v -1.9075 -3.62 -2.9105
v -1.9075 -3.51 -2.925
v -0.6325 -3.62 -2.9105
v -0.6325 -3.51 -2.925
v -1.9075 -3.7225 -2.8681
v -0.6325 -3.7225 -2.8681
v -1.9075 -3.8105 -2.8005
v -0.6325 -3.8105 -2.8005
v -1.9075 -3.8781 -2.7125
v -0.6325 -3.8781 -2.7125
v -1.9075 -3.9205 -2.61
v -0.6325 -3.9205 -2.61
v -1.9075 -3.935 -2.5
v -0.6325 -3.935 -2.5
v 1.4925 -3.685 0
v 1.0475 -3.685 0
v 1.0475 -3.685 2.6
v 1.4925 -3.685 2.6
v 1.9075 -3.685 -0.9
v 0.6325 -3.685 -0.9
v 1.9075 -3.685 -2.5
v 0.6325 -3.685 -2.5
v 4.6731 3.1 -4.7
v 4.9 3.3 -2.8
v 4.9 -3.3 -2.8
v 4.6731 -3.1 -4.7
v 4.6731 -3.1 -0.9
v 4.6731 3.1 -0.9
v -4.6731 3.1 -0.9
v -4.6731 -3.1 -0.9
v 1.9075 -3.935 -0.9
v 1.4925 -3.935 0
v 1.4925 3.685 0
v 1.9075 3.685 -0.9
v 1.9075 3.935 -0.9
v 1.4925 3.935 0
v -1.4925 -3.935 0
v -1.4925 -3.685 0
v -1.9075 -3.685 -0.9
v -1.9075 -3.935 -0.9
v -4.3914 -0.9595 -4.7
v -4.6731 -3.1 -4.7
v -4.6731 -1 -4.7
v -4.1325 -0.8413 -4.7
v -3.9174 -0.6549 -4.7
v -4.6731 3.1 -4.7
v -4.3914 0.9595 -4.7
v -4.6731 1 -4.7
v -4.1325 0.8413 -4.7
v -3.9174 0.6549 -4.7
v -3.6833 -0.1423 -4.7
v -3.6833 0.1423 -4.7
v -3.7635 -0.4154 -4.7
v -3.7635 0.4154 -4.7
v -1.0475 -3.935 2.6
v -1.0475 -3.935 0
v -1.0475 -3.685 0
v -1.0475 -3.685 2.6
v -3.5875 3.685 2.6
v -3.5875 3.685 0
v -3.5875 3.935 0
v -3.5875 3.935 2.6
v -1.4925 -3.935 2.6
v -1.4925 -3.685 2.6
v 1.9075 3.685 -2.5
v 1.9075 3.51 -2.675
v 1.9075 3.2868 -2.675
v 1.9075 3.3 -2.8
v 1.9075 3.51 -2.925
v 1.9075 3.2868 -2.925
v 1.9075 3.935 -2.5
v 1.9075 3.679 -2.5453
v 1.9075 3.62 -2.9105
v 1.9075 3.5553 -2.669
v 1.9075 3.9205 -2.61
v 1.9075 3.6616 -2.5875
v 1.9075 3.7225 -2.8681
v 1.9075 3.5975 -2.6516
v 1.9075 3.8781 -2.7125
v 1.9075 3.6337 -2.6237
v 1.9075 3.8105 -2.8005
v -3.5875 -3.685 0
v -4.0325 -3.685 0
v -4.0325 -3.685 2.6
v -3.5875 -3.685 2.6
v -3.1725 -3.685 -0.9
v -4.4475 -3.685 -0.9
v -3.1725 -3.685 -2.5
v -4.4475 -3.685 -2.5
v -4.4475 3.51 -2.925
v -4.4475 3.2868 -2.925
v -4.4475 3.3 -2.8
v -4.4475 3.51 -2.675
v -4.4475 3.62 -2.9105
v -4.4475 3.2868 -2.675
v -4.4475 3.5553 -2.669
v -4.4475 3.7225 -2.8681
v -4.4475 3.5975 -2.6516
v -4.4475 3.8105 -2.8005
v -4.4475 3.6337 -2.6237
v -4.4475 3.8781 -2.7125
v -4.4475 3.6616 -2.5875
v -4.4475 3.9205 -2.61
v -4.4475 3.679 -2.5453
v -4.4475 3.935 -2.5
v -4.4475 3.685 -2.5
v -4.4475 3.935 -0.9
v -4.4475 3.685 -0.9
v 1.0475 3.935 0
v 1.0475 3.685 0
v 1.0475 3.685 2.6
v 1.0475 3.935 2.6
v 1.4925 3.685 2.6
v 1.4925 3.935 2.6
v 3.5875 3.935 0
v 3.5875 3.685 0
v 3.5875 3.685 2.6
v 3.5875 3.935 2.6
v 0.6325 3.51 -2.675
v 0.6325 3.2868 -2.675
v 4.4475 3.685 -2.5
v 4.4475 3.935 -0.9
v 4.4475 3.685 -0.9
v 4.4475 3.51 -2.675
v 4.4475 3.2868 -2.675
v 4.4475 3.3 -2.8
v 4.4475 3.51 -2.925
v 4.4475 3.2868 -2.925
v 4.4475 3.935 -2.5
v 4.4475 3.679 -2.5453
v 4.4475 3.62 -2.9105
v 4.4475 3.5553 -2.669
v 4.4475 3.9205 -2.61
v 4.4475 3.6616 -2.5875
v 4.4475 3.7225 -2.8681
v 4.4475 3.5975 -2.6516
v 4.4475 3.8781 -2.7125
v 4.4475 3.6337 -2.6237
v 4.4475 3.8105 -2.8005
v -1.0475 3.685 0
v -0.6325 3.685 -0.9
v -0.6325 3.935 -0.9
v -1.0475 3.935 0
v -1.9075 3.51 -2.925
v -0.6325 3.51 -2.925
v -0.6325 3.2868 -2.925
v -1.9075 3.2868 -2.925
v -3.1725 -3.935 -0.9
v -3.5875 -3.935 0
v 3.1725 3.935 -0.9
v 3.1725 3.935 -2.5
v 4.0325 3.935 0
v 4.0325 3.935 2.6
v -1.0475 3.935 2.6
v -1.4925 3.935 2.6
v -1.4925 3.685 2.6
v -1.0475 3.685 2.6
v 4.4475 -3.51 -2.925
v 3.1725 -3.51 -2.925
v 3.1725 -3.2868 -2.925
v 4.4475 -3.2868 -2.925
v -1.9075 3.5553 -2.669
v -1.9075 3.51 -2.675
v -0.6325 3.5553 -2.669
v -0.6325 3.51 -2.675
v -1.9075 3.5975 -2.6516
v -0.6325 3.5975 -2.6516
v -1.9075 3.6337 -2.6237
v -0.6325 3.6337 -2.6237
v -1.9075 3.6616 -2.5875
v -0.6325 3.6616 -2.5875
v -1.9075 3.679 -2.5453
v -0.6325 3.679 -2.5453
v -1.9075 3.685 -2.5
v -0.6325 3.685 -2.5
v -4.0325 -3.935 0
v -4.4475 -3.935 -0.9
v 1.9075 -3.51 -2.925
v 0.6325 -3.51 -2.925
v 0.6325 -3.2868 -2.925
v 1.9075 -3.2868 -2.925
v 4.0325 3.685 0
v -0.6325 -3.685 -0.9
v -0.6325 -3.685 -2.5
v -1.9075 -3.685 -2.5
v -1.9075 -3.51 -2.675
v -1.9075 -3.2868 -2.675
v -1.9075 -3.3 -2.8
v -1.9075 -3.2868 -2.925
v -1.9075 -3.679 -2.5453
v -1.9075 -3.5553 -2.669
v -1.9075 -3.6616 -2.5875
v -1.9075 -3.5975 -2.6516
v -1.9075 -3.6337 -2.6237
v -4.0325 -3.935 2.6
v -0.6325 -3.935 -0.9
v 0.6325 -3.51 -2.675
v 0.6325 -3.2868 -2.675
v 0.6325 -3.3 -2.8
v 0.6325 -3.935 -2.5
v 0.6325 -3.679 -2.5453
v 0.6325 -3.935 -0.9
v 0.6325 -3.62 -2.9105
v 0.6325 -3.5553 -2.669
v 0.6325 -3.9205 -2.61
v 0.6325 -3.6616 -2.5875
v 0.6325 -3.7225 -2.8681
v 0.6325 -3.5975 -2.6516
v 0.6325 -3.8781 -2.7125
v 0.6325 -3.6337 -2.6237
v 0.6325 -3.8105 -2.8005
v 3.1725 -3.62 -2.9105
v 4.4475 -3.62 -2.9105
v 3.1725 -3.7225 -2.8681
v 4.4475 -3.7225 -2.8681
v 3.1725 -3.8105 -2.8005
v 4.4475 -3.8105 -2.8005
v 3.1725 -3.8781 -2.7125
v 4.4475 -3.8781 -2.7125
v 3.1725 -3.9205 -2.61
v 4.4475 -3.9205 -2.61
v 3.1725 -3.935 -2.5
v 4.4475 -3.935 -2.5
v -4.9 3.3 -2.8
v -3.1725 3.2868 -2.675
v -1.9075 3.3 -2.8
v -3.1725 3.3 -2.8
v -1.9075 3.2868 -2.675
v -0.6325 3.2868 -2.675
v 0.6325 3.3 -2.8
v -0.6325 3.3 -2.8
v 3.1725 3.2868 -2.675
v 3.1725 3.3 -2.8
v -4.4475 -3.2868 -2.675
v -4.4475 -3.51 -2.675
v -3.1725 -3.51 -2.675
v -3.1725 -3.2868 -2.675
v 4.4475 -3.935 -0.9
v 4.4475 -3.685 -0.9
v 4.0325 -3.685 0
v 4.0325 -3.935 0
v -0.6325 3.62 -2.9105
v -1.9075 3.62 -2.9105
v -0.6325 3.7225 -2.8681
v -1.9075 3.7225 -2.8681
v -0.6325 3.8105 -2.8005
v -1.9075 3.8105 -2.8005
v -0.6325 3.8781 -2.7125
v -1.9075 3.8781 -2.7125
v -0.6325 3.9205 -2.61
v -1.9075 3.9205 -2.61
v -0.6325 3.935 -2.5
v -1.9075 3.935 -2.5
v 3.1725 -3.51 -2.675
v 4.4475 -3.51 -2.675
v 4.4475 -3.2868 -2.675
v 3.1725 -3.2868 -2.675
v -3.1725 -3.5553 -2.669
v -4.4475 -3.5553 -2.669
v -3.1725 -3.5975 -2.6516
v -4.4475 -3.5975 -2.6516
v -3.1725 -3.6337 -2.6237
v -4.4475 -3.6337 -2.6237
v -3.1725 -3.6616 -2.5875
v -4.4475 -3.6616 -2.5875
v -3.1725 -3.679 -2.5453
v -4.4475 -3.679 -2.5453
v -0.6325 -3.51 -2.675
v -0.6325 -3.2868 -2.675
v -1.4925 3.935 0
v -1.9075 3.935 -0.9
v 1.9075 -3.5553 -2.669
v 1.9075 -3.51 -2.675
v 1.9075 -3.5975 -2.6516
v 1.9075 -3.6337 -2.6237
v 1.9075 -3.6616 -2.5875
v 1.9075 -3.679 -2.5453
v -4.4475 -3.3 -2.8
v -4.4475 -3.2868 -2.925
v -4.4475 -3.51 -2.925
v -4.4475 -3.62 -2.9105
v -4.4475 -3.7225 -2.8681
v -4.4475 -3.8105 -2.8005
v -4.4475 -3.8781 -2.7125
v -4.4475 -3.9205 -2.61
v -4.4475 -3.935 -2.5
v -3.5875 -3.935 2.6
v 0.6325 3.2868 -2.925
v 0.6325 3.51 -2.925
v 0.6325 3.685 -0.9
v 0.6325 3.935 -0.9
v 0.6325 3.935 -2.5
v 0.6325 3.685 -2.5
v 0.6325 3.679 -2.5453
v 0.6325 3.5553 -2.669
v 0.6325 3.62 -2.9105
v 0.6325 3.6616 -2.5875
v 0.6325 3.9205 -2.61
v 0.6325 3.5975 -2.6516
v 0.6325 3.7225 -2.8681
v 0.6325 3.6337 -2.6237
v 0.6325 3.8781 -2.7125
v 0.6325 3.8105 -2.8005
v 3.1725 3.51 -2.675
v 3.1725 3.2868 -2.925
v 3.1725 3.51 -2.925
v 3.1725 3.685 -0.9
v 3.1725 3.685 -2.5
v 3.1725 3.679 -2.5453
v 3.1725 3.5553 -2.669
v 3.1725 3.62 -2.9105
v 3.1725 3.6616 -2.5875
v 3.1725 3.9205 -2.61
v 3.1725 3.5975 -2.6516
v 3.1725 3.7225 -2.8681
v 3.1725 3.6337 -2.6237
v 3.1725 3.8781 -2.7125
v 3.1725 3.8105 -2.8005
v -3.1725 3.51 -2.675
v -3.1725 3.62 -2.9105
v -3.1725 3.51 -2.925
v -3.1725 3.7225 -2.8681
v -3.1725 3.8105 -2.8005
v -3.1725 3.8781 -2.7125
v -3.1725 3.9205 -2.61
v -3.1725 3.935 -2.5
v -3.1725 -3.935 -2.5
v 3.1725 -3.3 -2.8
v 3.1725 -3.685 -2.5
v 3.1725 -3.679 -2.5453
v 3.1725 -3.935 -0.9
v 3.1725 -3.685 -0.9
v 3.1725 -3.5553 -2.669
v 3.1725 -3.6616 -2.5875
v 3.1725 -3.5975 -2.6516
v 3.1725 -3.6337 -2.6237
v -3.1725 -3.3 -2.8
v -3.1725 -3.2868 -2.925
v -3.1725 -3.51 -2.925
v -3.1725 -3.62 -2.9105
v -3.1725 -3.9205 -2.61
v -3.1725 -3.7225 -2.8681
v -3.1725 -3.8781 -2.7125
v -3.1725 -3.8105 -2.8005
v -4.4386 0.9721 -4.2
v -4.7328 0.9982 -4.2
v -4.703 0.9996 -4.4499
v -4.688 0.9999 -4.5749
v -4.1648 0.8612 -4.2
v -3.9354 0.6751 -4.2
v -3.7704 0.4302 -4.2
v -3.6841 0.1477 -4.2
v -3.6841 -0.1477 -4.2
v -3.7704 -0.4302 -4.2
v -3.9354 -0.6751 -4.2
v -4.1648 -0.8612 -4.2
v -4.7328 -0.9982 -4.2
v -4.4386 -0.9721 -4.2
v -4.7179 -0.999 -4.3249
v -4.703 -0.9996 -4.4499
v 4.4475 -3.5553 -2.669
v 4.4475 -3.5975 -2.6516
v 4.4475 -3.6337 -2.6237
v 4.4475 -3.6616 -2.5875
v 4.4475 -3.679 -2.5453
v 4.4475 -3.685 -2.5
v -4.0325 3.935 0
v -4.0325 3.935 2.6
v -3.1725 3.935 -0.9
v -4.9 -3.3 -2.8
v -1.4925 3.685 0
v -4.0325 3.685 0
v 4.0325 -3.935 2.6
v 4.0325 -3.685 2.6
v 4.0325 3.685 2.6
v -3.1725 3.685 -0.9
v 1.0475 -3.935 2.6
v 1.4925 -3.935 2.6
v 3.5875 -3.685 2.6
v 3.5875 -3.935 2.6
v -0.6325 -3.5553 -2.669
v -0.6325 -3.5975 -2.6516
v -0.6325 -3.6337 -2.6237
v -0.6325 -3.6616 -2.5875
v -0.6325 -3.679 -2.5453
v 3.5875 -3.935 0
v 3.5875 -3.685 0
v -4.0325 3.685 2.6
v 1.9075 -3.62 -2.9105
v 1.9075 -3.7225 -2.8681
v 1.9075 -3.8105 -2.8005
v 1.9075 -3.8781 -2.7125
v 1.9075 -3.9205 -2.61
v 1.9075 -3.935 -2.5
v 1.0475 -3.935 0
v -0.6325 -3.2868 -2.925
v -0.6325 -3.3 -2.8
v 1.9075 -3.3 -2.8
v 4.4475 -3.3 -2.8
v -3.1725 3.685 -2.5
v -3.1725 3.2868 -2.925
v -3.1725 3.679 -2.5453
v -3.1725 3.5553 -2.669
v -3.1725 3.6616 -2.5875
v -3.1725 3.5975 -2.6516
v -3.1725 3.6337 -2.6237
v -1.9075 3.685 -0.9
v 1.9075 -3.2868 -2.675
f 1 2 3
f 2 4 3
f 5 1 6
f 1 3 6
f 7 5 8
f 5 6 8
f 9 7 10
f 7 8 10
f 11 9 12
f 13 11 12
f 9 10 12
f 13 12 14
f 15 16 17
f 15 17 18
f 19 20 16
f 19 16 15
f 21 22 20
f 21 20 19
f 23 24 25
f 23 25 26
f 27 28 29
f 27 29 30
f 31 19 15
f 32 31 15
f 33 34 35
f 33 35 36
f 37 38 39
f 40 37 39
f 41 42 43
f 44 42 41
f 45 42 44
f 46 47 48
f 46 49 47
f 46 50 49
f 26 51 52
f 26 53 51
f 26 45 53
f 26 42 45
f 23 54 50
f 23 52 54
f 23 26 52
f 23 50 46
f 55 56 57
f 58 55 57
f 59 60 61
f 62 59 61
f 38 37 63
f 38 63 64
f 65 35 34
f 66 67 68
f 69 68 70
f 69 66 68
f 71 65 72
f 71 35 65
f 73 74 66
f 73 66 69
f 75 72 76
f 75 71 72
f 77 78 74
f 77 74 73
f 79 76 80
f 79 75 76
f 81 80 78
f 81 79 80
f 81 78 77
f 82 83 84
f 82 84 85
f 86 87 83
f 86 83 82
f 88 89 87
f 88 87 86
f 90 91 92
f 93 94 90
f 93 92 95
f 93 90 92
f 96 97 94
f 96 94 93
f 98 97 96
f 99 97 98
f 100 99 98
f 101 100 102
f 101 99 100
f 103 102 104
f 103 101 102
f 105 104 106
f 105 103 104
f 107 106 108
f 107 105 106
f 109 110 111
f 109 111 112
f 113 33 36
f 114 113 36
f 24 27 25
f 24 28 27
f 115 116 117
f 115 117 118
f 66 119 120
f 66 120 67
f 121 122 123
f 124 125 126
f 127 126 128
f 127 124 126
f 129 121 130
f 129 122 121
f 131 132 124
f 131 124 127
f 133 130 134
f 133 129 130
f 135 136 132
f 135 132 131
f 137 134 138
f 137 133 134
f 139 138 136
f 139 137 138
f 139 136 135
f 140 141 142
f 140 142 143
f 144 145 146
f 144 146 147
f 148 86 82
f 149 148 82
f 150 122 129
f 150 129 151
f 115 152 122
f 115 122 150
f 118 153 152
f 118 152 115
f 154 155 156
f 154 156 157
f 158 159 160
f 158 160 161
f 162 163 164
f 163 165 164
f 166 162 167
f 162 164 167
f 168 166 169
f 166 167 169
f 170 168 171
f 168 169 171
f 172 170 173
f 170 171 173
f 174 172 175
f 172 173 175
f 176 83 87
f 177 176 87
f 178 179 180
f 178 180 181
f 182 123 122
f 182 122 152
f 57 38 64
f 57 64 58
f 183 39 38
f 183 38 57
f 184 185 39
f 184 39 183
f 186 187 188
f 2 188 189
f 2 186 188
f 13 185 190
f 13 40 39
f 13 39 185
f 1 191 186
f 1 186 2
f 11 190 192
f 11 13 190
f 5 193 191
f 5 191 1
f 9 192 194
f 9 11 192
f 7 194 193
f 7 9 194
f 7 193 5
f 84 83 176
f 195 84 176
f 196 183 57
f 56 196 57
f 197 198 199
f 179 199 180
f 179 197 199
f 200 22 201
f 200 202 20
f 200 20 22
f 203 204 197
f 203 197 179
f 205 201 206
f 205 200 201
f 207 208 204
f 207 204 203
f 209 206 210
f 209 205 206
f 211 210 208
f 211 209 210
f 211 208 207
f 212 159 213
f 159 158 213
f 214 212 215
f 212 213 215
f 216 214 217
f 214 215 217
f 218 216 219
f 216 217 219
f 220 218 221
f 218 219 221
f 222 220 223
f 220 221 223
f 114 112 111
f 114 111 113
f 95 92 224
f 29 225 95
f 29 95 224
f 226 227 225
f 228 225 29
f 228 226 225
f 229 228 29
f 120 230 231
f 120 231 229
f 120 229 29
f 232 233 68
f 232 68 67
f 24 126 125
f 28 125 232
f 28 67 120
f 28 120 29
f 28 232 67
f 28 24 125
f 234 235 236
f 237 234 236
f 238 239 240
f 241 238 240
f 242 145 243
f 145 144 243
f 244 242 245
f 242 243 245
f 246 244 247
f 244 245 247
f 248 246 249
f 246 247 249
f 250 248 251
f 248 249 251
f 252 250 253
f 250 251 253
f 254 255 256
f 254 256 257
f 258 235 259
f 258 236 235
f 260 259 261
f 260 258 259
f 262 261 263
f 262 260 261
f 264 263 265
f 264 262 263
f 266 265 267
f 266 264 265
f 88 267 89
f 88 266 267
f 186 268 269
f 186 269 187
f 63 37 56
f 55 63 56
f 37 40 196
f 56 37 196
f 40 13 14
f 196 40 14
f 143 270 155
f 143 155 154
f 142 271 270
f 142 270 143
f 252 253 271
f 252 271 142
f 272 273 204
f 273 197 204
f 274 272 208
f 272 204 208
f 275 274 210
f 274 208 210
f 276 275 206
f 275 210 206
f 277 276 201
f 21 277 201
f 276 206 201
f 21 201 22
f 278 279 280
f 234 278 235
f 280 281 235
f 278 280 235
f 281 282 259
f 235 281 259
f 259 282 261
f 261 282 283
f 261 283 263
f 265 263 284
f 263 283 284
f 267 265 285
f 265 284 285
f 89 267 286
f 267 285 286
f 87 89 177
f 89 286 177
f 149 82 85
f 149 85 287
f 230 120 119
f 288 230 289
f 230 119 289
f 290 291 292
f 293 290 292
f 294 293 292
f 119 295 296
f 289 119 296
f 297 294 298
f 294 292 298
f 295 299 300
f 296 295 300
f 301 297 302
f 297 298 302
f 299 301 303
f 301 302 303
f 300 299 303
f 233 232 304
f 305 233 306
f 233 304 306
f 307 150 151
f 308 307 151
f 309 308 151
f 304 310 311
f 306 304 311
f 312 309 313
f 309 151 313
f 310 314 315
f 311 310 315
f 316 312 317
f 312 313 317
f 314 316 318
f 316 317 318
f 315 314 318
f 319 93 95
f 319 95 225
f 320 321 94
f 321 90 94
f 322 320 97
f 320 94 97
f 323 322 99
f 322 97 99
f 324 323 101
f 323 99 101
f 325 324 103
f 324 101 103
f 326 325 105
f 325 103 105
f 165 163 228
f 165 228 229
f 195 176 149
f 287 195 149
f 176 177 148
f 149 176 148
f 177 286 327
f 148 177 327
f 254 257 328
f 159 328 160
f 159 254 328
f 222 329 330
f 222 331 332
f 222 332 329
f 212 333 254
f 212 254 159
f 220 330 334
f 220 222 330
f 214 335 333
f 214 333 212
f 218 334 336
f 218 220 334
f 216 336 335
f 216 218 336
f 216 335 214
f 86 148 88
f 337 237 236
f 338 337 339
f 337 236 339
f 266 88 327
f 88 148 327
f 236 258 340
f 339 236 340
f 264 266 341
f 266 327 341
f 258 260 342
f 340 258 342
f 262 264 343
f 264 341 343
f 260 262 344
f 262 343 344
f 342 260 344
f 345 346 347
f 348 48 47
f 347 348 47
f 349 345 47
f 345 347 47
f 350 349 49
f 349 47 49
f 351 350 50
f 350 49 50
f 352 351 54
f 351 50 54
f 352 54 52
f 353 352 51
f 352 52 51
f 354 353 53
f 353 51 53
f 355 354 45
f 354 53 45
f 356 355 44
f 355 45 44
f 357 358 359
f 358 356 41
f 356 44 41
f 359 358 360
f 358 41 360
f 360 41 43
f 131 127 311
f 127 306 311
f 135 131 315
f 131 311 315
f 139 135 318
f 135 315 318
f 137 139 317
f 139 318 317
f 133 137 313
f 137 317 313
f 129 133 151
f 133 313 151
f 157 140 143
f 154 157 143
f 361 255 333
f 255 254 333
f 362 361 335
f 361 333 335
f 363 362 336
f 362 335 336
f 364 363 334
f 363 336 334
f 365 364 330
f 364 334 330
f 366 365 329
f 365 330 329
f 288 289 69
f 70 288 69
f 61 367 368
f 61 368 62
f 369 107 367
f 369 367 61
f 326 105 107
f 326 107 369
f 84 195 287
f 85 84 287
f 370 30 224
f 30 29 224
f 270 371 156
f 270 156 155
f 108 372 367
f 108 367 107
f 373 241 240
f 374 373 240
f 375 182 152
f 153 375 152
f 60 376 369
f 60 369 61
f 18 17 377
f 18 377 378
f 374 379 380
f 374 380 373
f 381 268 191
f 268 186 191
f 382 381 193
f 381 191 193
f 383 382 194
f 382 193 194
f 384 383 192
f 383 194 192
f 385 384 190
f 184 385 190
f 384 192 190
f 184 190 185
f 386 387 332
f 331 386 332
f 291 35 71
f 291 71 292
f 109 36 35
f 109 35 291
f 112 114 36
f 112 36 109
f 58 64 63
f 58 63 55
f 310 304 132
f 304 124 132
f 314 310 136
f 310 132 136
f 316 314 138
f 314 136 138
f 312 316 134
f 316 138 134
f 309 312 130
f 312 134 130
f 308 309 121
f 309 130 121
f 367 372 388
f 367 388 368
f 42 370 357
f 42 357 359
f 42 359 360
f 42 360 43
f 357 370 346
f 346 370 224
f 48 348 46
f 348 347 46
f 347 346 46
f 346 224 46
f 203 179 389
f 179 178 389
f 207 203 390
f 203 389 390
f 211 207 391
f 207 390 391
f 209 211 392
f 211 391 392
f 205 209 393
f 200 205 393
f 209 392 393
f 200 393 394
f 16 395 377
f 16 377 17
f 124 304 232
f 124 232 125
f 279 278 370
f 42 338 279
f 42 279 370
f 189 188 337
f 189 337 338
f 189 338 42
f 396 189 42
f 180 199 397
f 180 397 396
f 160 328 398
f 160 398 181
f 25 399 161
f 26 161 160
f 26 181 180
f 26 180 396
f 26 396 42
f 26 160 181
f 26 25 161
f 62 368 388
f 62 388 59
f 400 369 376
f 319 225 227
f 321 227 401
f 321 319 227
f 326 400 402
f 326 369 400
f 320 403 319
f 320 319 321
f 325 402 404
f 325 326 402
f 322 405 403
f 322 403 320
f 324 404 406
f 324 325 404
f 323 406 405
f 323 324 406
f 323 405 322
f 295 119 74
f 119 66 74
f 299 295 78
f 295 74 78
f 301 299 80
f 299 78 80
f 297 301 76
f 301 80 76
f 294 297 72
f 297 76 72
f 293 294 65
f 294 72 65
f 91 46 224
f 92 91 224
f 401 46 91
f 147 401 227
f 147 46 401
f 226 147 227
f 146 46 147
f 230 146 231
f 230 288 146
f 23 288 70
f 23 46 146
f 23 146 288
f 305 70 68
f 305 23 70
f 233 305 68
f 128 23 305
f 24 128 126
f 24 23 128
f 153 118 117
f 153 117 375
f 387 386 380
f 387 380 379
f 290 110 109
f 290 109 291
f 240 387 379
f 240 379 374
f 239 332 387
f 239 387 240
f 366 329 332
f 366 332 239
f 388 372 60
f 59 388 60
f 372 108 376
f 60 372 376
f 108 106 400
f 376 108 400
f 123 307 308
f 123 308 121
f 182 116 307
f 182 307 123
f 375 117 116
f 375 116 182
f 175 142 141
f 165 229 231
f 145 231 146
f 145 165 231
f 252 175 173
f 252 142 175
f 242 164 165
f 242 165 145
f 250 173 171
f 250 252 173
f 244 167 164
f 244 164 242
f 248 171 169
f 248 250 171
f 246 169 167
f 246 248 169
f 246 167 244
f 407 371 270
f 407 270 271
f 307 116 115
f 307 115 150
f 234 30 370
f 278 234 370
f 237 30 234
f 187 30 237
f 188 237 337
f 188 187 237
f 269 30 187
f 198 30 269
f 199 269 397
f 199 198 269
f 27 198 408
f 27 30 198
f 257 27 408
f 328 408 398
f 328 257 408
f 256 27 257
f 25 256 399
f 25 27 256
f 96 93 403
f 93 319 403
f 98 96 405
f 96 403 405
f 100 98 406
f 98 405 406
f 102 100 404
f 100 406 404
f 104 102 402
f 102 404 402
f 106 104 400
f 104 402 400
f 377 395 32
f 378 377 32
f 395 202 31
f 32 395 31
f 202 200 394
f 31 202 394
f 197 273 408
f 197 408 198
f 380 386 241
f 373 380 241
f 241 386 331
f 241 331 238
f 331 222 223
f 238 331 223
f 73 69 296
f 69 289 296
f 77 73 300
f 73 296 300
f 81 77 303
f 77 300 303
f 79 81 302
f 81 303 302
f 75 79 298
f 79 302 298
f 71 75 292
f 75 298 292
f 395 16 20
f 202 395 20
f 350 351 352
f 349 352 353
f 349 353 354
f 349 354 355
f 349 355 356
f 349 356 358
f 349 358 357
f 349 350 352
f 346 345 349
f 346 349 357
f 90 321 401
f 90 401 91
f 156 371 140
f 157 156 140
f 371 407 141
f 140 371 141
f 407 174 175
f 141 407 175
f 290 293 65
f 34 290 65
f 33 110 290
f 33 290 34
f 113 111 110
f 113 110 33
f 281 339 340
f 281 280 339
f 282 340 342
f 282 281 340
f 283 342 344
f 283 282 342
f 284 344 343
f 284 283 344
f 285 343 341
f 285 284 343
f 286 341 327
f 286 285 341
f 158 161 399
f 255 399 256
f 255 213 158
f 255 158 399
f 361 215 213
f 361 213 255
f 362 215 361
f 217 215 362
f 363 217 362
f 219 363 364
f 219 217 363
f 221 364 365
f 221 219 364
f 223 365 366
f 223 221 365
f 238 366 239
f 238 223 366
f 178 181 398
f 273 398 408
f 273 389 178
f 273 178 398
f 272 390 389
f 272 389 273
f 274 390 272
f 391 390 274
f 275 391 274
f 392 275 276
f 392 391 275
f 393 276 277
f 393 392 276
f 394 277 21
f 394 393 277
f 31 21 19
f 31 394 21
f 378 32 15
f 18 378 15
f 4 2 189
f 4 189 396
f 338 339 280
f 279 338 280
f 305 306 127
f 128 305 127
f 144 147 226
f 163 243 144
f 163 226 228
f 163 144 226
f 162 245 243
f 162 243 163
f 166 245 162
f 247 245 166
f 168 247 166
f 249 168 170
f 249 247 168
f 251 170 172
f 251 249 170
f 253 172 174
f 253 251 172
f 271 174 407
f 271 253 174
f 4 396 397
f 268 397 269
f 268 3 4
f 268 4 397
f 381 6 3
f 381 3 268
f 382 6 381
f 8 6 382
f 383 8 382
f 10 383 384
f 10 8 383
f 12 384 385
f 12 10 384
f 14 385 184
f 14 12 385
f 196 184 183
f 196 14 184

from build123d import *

# Parameters (mm, degrees)
RESSALTO_EXTRUS_O1_DEPTH        = 4.9
CORTE_EXTRUS_O2_DEPTH           = 3.55
ESBO_O8_R                       = 1
CORTE_EXTRUS_O5_DEPTH           = 0.5
ESBO_O6_W                       = 1.275
ESBO_O6_H                       = 0.25
RESSALTO_EXTRUS_O2_DEPTH        = 0.025
ESBO_O7_W                       = 1.275
ESBO_O7_H                       = 0.25
CORTE_EXTRUS_O6_START           = -0.25
CORTE_EXTRUS_O6_DEPTH           = 0.25
ESBO_O10_W                      = 0.445
ESBO_O10_H                      = 0.25
RESSALTO_EXTRUS_O3_DEPTH        = 2.6
PADR_O_LINEAR1_COUNT            = 4
PADR_O_LINEAR1_PITCH            = 2.54
PADR_O_LINEAR1_COPY_1_SKETCH_W  = 1.275
PADR_O_LINEAR1_COPY_1_SKETCH_H  = 0.25
PADR_O_LINEAR1_COPY_1_DEPTH     = 0.025
PADR_O_LINEAR1_COPY_2_SKETCH_W  = 1.275
PADR_O_LINEAR1_COPY_2_SKETCH_H  = 0.25
PADR_O_LINEAR1_COPY_2_DEPTH     = 0.025
PADR_O_LINEAR1_COPY_3_SKETCH_W  = 1.275
PADR_O_LINEAR1_COPY_3_SKETCH_H  = 0.25
PADR_O_LINEAR1_COPY_3_DEPTH     = 0.025
PADR_O_LINEAR1_COPY_4_SKETCH_W  = 1.275
PADR_O_LINEAR1_COPY_4_SKETCH_H  = 0.25
PADR_O_LINEAR1_COPY_5_SKETCH_W  = 1.275
PADR_O_LINEAR1_COPY_5_SKETCH_H  = 0.25
PADR_O_LINEAR1_COPY_6_SKETCH_W  = 1.275
PADR_O_LINEAR1_COPY_6_SKETCH_H  = 0.25
PADR_O_START                    = -0.25
PADR_O_LINEAR1_COPY_7_DEPTH     = 0.25
PADR_O_LINEAR1_COPY_8_DEPTH     = 0.25
PADR_O_LINEAR1_COPY_9_DEPTH     = 0.25
PADR_O_LINEAR1_COPY_10_SKETCH_W = 0.445
PADR_O_LINEAR1_COPY_10_SKETCH_H = 0.25
PADR_O_LINEAR1_COPY_10_DEPTH    = 2.6
PADR_O_LINEAR1_COPY_11_SKETCH_W = 0.445
PADR_O_LINEAR1_COPY_11_SKETCH_H = 0.25
PADR_O_LINEAR1_COPY_11_DEPTH    = 2.6
PADR_O_LINEAR1_COPY_12_SKETCH_W = 0.445
PADR_O_LINEAR1_COPY_12_SKETCH_H = 0.25
PADR_O_LINEAR1_COPY_12_DEPTH    = 2.6


with BuildPart() as part:
    # Esboço1 → Ressalto-extrusão1 (new, symmetric)
    with BuildSketch(Plane(origin=(0, 0, 0), x_dir=(0, 0, -1), z_dir=(1, 0, 0))):
        Polygon((0.9, 3.1), (0.9, -3.1), (2.8, -3.3), (4.7, -3.1), (4.7, 3.1), (2.8, 3.3), align=None)
    extrude(amount=RESSALTO_EXTRUS_O1_DEPTH, both=True)

    # Esboço3 → Corte-extrusão2 (cut, symmetric)
    with BuildSketch(Plane(origin=(0, 0, 0), x_dir=(1, 0, 0), z_dir=(0, 1, 0))):
        Polygon((-4.9, 2.8), (-4.669897634, 4.726835982), (-5.836348907, 4.726835982), (-5.836348907, 0.873164018), (-4.669897634, 0.873164018), align=None)
    corte_extrus_o2 = extrude(amount=CORTE_EXTRUS_O2_DEPTH, both=True, mode=Mode.SUBTRACT)

    # Espelhar1: Corte-extrusão2 across plane
    add(corte_extrus_o2.mirror(Plane(origin=(0, 0, 0), x_dir=(0, 0, 1), z_dir=(1, 0, 0))), mode=Mode.SUBTRACT)

    # Esboço8 → Corte-extrusão5 (cut)
    with BuildSketch(Plane(origin=(0, 0, -4.7), x_dir=(-1, 0, 0), z_dir=(0, 0, -1))):
        with Locations((4.673102382, 0)):
            Circle(ESBO_O8_R)
    extrude(amount=-CORTE_EXTRUS_O5_DEPTH, mode=Mode.SUBTRACT)

    # Esboço6 → Ressalto-extrusão2 (add, symmetric)
    with BuildSketch(Plane(origin=(0, 3.3, 0), x_dir=(1, 0, 0), z_dir=(0, 1, 0))):
        with Locations((-3.81, 2.8)):
            Rectangle(ESBO_O6_W, ESBO_O6_H)
    ressalto_extrus_o2 = extrude(amount=RESSALTO_EXTRUS_O2_DEPTH, both=True)

    # Varredura1: sweep along a curve in space
    with BuildLine() as varredura1_path:
        Line((-3.81, 3.325, -2.8), (-3.81, 3.51, -2.8))
        ThreePointArc((-3.81, 3.51, -2.8), (-3.81, 3.722132034, -2.712132034), (-3.81, 3.81, -2.5))
        Line((-3.81, 3.81, -2.5), (-3.81, 3.81, 0))
    # Esboço7 → Varredura1 (sweep)
    with BuildSketch(Plane(origin=(0, 3.325, 0), x_dir=(1, 0, 0), z_dir=(0, 1, 0))):
        with Locations((-3.81, 2.8)):
            Rectangle(ESBO_O7_W, ESBO_O7_H)
    varredura1 = sweep(path=varredura1_path.line)

    # Esboço9 → Corte-extrusão6 (cut)
    with BuildSketch(Plane(origin=(0, 3.935, 0), x_dir=(1, 0, 0), z_dir=(0, 1, 0)).offset(CORTE_EXTRUS_O6_START)):
        Polygon((-4.0325, 0), (-4.4475, 0.9), (-4.4475, -0.2), (-3.1725, -0.2), (-3.1725, 0.9), (-3.5875, 0), align=None)
    corte_extrus_o6 = extrude(amount=CORTE_EXTRUS_O6_DEPTH, mode=Mode.SUBTRACT)

    # Esboço10 → Ressalto-extrusão3 (add)
    with BuildSketch(Plane.XY):
        with Locations((-3.81, 3.81)):
            Rectangle(ESBO_O10_W, ESBO_O10_H)
    ressalto_extrus_o3 = extrude(amount=RESSALTO_EXTRUS_O3_DEPTH)

    # Espelhar2: Ressalto-extrusão2, Varredura1, Corte-extrusão6, Ressalto-extrusão3 across plane
    add(ressalto_extrus_o2.mirror(Plane.ZX))
    add(varredura1.mirror(Plane.ZX))
    add(corte_extrus_o6.mirror(Plane.ZX), mode=Mode.SUBTRACT)
    add(ressalto_extrus_o3.mirror(Plane.ZX))

    # Padrão linear1: Ressalto-extrusão2, Varredura1, Corte-extrusão6, Ressalto-extrusão3 ×4
    with Locations(*[(i * PADR_O_LINEAR1_PITCH, 0, 0) for i in range(1, PADR_O_LINEAR1_COUNT)]):
        add(ressalto_extrus_o2)
        add(varredura1)
        add(corte_extrus_o6, mode=Mode.SUBTRACT)
        add(ressalto_extrus_o3)

    # Padrão linear1 copy 1 sketch → Padrão linear1 copy 1 (add, symmetric)
    with BuildSketch(Plane(origin=(2.54, -3.3, 0), x_dir=(1, 0, 0), z_dir=(0, -1, 0))):
        with Locations((-3.81, -2.8)):
            Rectangle(PADR_O_LINEAR1_COPY_1_SKETCH_W, PADR_O_LINEAR1_COPY_1_SKETCH_H)
    extrude(amount=PADR_O_LINEAR1_COPY_1_DEPTH, both=True)

    # Padrão linear1 copy 2 sketch → Padrão linear1 copy 2 (add, symmetric)
    with BuildSketch(Plane(origin=(5.08, -3.3, 0), x_dir=(1, 0, 0), z_dir=(0, -1, 0))):
        with Locations((-3.81, -2.8)):
            Rectangle(PADR_O_LINEAR1_COPY_2_SKETCH_W, PADR_O_LINEAR1_COPY_2_SKETCH_H)
    extrude(amount=PADR_O_LINEAR1_COPY_2_DEPTH, both=True)

    # Padrão linear1 copy 3 sketch → Padrão linear1 copy 3 (add, symmetric)
    with BuildSketch(Plane(origin=(7.62, -3.3, 0), x_dir=(1, 0, 0), z_dir=(0, -1, 0))):
        with Locations((-3.81, -2.8)):
            Rectangle(PADR_O_LINEAR1_COPY_3_SKETCH_W, PADR_O_LINEAR1_COPY_3_SKETCH_H)
    extrude(amount=PADR_O_LINEAR1_COPY_3_DEPTH, both=True)

    # Padrão linear1 copy 4: sweep along a curve in space
    with BuildLine() as padr_o_linear1_copy_4_path:
        Line((-1.27, -3.325, -2.8), (-1.27, -3.51, -2.8))
        ThreePointArc((-1.27, -3.51, -2.8), (-1.27, -3.722132034, -2.712132034), (-1.27, -3.81, -2.5))
        Line((-1.27, -3.81, -2.5), (-1.27, -3.81, 0))
    # Padrão linear1 copy 4 sketch → Padrão linear1 copy 4 (sweep)
    with BuildSketch(Plane(origin=(2.54, -3.325, 0), x_dir=(1, 0, 0), z_dir=(0, -1, 0))):
        with Locations((-3.81, -2.8)):
            Rectangle(PADR_O_LINEAR1_COPY_4_SKETCH_W, PADR_O_LINEAR1_COPY_4_SKETCH_H)
    sweep(path=padr_o_linear1_copy_4_path.line)

    # Padrão linear1 copy 5: sweep along a curve in space
    with BuildLine() as padr_o_linear1_copy_5_path:
        Line((1.27, -3.325, -2.8), (1.27, -3.51, -2.8))
        ThreePointArc((1.27, -3.51, -2.8), (1.27, -3.722132034, -2.712132034), (1.27, -3.81, -2.5))
        Line((1.27, -3.81, -2.5), (1.27, -3.81, 0))
    # Padrão linear1 copy 5 sketch → Padrão linear1 copy 5 (sweep)
    with BuildSketch(Plane(origin=(5.08, -3.325, 0), x_dir=(1, 0, 0), z_dir=(0, -1, 0))):
        with Locations((-3.81, -2.8)):
            Rectangle(PADR_O_LINEAR1_COPY_5_SKETCH_W, PADR_O_LINEAR1_COPY_5_SKETCH_H)
    sweep(path=padr_o_linear1_copy_5_path.line)

    # Padrão linear1 copy 6: sweep along a curve in space
    with BuildLine() as padr_o_linear1_copy_6_path:
        Line((3.81, -3.325, -2.8), (3.81, -3.51, -2.8))
        ThreePointArc((3.81, -3.51, -2.8), (3.81, -3.722132034, -2.712132034), (3.81, -3.81, -2.5))
        Line((3.81, -3.81, -2.5), (3.81, -3.81, 0))
    # Padrão linear1 copy 6 sketch → Padrão linear1 copy 6 (sweep)
    with BuildSketch(Plane(origin=(7.62, -3.325, 0), x_dir=(1, 0, 0), z_dir=(0, -1, 0))):
        with Locations((-3.81, -2.8)):
            Rectangle(PADR_O_LINEAR1_COPY_6_SKETCH_W, PADR_O_LINEAR1_COPY_6_SKETCH_H)
    sweep(path=padr_o_linear1_copy_6_path.line)

    # Padrão linear1 copy 7 sketch → Padrão linear1 copy 7 (cut)
    with BuildSketch(Plane(origin=(2.54, -3.935, 0), x_dir=(1, 0, 0), z_dir=(0, -1, 0)).offset(PADR_O_START)):
        Polygon((-4.0325, 0), (-4.4475, -0.9), (-4.4475, 0.2), (-3.1725, 0.2), (-3.1725, -0.9), (-3.5875, 0), align=None)
    extrude(amount=PADR_O_LINEAR1_COPY_7_DEPTH, mode=Mode.SUBTRACT)

    # Padrão linear1 copy 8 sketch → Padrão linear1 copy 8 (cut)
    with BuildSketch(Plane(origin=(5.08, -3.935, 0), x_dir=(1, 0, 0), z_dir=(0, -1, 0)).offset(PADR_O_START)):
        Polygon((-4.0325, 0), (-4.4475, -0.9), (-4.4475, 0.2), (-3.1725, 0.2), (-3.1725, -0.9), (-3.5875, 0), align=None)
    extrude(amount=PADR_O_LINEAR1_COPY_8_DEPTH, mode=Mode.SUBTRACT)

    # Padrão linear1 copy 9 sketch → Padrão linear1 copy 9 (cut)
    with BuildSketch(Plane(origin=(7.62, -3.935, 0), x_dir=(1, 0, 0), z_dir=(0, -1, 0)).offset(PADR_O_START)):
        Polygon((-4.0325, 0), (-4.4475, -0.9), (-4.4475, 0.2), (-3.1725, 0.2), (-3.1725, -0.9), (-3.5875, 0), align=None)
    extrude(amount=PADR_O_LINEAR1_COPY_9_DEPTH, mode=Mode.SUBTRACT)

    # Padrão linear1 copy 10 sketch → Padrão linear1 copy 10 (add)
    with BuildSketch(Plane(origin=(2.54, 0, 0), x_dir=(1, 0, 0), z_dir=(0, 0, 1))):
        with Locations((-3.81, -3.81)):
            Rectangle(PADR_O_LINEAR1_COPY_10_SKETCH_W, PADR_O_LINEAR1_COPY_10_SKETCH_H)
    extrude(amount=PADR_O_LINEAR1_COPY_10_DEPTH)

    # Padrão linear1 copy 11 sketch → Padrão linear1 copy 11 (add)
    with BuildSketch(Plane(origin=(5.08, 0, 0), x_dir=(1, 0, 0), z_dir=(0, 0, 1))):
        with Locations((-3.81, -3.81)):
            Rectangle(PADR_O_LINEAR1_COPY_11_SKETCH_W, PADR_O_LINEAR1_COPY_11_SKETCH_H)
    extrude(amount=PADR_O_LINEAR1_COPY_11_DEPTH)

    # Padrão linear1 copy 12 sketch → Padrão linear1 copy 12 (add)
    with BuildSketch(Plane(origin=(7.62, 0, 0), x_dir=(1, 0, 0), z_dir=(0, 0, 1))):
        with Locations((-3.81, -3.81)):
            Rectangle(PADR_O_LINEAR1_COPY_12_SKETCH_W, PADR_O_LINEAR1_COPY_12_SKETCH_H)
    extrude(amount=PADR_O_LINEAR1_COPY_12_DEPTH)


solid = part.part
